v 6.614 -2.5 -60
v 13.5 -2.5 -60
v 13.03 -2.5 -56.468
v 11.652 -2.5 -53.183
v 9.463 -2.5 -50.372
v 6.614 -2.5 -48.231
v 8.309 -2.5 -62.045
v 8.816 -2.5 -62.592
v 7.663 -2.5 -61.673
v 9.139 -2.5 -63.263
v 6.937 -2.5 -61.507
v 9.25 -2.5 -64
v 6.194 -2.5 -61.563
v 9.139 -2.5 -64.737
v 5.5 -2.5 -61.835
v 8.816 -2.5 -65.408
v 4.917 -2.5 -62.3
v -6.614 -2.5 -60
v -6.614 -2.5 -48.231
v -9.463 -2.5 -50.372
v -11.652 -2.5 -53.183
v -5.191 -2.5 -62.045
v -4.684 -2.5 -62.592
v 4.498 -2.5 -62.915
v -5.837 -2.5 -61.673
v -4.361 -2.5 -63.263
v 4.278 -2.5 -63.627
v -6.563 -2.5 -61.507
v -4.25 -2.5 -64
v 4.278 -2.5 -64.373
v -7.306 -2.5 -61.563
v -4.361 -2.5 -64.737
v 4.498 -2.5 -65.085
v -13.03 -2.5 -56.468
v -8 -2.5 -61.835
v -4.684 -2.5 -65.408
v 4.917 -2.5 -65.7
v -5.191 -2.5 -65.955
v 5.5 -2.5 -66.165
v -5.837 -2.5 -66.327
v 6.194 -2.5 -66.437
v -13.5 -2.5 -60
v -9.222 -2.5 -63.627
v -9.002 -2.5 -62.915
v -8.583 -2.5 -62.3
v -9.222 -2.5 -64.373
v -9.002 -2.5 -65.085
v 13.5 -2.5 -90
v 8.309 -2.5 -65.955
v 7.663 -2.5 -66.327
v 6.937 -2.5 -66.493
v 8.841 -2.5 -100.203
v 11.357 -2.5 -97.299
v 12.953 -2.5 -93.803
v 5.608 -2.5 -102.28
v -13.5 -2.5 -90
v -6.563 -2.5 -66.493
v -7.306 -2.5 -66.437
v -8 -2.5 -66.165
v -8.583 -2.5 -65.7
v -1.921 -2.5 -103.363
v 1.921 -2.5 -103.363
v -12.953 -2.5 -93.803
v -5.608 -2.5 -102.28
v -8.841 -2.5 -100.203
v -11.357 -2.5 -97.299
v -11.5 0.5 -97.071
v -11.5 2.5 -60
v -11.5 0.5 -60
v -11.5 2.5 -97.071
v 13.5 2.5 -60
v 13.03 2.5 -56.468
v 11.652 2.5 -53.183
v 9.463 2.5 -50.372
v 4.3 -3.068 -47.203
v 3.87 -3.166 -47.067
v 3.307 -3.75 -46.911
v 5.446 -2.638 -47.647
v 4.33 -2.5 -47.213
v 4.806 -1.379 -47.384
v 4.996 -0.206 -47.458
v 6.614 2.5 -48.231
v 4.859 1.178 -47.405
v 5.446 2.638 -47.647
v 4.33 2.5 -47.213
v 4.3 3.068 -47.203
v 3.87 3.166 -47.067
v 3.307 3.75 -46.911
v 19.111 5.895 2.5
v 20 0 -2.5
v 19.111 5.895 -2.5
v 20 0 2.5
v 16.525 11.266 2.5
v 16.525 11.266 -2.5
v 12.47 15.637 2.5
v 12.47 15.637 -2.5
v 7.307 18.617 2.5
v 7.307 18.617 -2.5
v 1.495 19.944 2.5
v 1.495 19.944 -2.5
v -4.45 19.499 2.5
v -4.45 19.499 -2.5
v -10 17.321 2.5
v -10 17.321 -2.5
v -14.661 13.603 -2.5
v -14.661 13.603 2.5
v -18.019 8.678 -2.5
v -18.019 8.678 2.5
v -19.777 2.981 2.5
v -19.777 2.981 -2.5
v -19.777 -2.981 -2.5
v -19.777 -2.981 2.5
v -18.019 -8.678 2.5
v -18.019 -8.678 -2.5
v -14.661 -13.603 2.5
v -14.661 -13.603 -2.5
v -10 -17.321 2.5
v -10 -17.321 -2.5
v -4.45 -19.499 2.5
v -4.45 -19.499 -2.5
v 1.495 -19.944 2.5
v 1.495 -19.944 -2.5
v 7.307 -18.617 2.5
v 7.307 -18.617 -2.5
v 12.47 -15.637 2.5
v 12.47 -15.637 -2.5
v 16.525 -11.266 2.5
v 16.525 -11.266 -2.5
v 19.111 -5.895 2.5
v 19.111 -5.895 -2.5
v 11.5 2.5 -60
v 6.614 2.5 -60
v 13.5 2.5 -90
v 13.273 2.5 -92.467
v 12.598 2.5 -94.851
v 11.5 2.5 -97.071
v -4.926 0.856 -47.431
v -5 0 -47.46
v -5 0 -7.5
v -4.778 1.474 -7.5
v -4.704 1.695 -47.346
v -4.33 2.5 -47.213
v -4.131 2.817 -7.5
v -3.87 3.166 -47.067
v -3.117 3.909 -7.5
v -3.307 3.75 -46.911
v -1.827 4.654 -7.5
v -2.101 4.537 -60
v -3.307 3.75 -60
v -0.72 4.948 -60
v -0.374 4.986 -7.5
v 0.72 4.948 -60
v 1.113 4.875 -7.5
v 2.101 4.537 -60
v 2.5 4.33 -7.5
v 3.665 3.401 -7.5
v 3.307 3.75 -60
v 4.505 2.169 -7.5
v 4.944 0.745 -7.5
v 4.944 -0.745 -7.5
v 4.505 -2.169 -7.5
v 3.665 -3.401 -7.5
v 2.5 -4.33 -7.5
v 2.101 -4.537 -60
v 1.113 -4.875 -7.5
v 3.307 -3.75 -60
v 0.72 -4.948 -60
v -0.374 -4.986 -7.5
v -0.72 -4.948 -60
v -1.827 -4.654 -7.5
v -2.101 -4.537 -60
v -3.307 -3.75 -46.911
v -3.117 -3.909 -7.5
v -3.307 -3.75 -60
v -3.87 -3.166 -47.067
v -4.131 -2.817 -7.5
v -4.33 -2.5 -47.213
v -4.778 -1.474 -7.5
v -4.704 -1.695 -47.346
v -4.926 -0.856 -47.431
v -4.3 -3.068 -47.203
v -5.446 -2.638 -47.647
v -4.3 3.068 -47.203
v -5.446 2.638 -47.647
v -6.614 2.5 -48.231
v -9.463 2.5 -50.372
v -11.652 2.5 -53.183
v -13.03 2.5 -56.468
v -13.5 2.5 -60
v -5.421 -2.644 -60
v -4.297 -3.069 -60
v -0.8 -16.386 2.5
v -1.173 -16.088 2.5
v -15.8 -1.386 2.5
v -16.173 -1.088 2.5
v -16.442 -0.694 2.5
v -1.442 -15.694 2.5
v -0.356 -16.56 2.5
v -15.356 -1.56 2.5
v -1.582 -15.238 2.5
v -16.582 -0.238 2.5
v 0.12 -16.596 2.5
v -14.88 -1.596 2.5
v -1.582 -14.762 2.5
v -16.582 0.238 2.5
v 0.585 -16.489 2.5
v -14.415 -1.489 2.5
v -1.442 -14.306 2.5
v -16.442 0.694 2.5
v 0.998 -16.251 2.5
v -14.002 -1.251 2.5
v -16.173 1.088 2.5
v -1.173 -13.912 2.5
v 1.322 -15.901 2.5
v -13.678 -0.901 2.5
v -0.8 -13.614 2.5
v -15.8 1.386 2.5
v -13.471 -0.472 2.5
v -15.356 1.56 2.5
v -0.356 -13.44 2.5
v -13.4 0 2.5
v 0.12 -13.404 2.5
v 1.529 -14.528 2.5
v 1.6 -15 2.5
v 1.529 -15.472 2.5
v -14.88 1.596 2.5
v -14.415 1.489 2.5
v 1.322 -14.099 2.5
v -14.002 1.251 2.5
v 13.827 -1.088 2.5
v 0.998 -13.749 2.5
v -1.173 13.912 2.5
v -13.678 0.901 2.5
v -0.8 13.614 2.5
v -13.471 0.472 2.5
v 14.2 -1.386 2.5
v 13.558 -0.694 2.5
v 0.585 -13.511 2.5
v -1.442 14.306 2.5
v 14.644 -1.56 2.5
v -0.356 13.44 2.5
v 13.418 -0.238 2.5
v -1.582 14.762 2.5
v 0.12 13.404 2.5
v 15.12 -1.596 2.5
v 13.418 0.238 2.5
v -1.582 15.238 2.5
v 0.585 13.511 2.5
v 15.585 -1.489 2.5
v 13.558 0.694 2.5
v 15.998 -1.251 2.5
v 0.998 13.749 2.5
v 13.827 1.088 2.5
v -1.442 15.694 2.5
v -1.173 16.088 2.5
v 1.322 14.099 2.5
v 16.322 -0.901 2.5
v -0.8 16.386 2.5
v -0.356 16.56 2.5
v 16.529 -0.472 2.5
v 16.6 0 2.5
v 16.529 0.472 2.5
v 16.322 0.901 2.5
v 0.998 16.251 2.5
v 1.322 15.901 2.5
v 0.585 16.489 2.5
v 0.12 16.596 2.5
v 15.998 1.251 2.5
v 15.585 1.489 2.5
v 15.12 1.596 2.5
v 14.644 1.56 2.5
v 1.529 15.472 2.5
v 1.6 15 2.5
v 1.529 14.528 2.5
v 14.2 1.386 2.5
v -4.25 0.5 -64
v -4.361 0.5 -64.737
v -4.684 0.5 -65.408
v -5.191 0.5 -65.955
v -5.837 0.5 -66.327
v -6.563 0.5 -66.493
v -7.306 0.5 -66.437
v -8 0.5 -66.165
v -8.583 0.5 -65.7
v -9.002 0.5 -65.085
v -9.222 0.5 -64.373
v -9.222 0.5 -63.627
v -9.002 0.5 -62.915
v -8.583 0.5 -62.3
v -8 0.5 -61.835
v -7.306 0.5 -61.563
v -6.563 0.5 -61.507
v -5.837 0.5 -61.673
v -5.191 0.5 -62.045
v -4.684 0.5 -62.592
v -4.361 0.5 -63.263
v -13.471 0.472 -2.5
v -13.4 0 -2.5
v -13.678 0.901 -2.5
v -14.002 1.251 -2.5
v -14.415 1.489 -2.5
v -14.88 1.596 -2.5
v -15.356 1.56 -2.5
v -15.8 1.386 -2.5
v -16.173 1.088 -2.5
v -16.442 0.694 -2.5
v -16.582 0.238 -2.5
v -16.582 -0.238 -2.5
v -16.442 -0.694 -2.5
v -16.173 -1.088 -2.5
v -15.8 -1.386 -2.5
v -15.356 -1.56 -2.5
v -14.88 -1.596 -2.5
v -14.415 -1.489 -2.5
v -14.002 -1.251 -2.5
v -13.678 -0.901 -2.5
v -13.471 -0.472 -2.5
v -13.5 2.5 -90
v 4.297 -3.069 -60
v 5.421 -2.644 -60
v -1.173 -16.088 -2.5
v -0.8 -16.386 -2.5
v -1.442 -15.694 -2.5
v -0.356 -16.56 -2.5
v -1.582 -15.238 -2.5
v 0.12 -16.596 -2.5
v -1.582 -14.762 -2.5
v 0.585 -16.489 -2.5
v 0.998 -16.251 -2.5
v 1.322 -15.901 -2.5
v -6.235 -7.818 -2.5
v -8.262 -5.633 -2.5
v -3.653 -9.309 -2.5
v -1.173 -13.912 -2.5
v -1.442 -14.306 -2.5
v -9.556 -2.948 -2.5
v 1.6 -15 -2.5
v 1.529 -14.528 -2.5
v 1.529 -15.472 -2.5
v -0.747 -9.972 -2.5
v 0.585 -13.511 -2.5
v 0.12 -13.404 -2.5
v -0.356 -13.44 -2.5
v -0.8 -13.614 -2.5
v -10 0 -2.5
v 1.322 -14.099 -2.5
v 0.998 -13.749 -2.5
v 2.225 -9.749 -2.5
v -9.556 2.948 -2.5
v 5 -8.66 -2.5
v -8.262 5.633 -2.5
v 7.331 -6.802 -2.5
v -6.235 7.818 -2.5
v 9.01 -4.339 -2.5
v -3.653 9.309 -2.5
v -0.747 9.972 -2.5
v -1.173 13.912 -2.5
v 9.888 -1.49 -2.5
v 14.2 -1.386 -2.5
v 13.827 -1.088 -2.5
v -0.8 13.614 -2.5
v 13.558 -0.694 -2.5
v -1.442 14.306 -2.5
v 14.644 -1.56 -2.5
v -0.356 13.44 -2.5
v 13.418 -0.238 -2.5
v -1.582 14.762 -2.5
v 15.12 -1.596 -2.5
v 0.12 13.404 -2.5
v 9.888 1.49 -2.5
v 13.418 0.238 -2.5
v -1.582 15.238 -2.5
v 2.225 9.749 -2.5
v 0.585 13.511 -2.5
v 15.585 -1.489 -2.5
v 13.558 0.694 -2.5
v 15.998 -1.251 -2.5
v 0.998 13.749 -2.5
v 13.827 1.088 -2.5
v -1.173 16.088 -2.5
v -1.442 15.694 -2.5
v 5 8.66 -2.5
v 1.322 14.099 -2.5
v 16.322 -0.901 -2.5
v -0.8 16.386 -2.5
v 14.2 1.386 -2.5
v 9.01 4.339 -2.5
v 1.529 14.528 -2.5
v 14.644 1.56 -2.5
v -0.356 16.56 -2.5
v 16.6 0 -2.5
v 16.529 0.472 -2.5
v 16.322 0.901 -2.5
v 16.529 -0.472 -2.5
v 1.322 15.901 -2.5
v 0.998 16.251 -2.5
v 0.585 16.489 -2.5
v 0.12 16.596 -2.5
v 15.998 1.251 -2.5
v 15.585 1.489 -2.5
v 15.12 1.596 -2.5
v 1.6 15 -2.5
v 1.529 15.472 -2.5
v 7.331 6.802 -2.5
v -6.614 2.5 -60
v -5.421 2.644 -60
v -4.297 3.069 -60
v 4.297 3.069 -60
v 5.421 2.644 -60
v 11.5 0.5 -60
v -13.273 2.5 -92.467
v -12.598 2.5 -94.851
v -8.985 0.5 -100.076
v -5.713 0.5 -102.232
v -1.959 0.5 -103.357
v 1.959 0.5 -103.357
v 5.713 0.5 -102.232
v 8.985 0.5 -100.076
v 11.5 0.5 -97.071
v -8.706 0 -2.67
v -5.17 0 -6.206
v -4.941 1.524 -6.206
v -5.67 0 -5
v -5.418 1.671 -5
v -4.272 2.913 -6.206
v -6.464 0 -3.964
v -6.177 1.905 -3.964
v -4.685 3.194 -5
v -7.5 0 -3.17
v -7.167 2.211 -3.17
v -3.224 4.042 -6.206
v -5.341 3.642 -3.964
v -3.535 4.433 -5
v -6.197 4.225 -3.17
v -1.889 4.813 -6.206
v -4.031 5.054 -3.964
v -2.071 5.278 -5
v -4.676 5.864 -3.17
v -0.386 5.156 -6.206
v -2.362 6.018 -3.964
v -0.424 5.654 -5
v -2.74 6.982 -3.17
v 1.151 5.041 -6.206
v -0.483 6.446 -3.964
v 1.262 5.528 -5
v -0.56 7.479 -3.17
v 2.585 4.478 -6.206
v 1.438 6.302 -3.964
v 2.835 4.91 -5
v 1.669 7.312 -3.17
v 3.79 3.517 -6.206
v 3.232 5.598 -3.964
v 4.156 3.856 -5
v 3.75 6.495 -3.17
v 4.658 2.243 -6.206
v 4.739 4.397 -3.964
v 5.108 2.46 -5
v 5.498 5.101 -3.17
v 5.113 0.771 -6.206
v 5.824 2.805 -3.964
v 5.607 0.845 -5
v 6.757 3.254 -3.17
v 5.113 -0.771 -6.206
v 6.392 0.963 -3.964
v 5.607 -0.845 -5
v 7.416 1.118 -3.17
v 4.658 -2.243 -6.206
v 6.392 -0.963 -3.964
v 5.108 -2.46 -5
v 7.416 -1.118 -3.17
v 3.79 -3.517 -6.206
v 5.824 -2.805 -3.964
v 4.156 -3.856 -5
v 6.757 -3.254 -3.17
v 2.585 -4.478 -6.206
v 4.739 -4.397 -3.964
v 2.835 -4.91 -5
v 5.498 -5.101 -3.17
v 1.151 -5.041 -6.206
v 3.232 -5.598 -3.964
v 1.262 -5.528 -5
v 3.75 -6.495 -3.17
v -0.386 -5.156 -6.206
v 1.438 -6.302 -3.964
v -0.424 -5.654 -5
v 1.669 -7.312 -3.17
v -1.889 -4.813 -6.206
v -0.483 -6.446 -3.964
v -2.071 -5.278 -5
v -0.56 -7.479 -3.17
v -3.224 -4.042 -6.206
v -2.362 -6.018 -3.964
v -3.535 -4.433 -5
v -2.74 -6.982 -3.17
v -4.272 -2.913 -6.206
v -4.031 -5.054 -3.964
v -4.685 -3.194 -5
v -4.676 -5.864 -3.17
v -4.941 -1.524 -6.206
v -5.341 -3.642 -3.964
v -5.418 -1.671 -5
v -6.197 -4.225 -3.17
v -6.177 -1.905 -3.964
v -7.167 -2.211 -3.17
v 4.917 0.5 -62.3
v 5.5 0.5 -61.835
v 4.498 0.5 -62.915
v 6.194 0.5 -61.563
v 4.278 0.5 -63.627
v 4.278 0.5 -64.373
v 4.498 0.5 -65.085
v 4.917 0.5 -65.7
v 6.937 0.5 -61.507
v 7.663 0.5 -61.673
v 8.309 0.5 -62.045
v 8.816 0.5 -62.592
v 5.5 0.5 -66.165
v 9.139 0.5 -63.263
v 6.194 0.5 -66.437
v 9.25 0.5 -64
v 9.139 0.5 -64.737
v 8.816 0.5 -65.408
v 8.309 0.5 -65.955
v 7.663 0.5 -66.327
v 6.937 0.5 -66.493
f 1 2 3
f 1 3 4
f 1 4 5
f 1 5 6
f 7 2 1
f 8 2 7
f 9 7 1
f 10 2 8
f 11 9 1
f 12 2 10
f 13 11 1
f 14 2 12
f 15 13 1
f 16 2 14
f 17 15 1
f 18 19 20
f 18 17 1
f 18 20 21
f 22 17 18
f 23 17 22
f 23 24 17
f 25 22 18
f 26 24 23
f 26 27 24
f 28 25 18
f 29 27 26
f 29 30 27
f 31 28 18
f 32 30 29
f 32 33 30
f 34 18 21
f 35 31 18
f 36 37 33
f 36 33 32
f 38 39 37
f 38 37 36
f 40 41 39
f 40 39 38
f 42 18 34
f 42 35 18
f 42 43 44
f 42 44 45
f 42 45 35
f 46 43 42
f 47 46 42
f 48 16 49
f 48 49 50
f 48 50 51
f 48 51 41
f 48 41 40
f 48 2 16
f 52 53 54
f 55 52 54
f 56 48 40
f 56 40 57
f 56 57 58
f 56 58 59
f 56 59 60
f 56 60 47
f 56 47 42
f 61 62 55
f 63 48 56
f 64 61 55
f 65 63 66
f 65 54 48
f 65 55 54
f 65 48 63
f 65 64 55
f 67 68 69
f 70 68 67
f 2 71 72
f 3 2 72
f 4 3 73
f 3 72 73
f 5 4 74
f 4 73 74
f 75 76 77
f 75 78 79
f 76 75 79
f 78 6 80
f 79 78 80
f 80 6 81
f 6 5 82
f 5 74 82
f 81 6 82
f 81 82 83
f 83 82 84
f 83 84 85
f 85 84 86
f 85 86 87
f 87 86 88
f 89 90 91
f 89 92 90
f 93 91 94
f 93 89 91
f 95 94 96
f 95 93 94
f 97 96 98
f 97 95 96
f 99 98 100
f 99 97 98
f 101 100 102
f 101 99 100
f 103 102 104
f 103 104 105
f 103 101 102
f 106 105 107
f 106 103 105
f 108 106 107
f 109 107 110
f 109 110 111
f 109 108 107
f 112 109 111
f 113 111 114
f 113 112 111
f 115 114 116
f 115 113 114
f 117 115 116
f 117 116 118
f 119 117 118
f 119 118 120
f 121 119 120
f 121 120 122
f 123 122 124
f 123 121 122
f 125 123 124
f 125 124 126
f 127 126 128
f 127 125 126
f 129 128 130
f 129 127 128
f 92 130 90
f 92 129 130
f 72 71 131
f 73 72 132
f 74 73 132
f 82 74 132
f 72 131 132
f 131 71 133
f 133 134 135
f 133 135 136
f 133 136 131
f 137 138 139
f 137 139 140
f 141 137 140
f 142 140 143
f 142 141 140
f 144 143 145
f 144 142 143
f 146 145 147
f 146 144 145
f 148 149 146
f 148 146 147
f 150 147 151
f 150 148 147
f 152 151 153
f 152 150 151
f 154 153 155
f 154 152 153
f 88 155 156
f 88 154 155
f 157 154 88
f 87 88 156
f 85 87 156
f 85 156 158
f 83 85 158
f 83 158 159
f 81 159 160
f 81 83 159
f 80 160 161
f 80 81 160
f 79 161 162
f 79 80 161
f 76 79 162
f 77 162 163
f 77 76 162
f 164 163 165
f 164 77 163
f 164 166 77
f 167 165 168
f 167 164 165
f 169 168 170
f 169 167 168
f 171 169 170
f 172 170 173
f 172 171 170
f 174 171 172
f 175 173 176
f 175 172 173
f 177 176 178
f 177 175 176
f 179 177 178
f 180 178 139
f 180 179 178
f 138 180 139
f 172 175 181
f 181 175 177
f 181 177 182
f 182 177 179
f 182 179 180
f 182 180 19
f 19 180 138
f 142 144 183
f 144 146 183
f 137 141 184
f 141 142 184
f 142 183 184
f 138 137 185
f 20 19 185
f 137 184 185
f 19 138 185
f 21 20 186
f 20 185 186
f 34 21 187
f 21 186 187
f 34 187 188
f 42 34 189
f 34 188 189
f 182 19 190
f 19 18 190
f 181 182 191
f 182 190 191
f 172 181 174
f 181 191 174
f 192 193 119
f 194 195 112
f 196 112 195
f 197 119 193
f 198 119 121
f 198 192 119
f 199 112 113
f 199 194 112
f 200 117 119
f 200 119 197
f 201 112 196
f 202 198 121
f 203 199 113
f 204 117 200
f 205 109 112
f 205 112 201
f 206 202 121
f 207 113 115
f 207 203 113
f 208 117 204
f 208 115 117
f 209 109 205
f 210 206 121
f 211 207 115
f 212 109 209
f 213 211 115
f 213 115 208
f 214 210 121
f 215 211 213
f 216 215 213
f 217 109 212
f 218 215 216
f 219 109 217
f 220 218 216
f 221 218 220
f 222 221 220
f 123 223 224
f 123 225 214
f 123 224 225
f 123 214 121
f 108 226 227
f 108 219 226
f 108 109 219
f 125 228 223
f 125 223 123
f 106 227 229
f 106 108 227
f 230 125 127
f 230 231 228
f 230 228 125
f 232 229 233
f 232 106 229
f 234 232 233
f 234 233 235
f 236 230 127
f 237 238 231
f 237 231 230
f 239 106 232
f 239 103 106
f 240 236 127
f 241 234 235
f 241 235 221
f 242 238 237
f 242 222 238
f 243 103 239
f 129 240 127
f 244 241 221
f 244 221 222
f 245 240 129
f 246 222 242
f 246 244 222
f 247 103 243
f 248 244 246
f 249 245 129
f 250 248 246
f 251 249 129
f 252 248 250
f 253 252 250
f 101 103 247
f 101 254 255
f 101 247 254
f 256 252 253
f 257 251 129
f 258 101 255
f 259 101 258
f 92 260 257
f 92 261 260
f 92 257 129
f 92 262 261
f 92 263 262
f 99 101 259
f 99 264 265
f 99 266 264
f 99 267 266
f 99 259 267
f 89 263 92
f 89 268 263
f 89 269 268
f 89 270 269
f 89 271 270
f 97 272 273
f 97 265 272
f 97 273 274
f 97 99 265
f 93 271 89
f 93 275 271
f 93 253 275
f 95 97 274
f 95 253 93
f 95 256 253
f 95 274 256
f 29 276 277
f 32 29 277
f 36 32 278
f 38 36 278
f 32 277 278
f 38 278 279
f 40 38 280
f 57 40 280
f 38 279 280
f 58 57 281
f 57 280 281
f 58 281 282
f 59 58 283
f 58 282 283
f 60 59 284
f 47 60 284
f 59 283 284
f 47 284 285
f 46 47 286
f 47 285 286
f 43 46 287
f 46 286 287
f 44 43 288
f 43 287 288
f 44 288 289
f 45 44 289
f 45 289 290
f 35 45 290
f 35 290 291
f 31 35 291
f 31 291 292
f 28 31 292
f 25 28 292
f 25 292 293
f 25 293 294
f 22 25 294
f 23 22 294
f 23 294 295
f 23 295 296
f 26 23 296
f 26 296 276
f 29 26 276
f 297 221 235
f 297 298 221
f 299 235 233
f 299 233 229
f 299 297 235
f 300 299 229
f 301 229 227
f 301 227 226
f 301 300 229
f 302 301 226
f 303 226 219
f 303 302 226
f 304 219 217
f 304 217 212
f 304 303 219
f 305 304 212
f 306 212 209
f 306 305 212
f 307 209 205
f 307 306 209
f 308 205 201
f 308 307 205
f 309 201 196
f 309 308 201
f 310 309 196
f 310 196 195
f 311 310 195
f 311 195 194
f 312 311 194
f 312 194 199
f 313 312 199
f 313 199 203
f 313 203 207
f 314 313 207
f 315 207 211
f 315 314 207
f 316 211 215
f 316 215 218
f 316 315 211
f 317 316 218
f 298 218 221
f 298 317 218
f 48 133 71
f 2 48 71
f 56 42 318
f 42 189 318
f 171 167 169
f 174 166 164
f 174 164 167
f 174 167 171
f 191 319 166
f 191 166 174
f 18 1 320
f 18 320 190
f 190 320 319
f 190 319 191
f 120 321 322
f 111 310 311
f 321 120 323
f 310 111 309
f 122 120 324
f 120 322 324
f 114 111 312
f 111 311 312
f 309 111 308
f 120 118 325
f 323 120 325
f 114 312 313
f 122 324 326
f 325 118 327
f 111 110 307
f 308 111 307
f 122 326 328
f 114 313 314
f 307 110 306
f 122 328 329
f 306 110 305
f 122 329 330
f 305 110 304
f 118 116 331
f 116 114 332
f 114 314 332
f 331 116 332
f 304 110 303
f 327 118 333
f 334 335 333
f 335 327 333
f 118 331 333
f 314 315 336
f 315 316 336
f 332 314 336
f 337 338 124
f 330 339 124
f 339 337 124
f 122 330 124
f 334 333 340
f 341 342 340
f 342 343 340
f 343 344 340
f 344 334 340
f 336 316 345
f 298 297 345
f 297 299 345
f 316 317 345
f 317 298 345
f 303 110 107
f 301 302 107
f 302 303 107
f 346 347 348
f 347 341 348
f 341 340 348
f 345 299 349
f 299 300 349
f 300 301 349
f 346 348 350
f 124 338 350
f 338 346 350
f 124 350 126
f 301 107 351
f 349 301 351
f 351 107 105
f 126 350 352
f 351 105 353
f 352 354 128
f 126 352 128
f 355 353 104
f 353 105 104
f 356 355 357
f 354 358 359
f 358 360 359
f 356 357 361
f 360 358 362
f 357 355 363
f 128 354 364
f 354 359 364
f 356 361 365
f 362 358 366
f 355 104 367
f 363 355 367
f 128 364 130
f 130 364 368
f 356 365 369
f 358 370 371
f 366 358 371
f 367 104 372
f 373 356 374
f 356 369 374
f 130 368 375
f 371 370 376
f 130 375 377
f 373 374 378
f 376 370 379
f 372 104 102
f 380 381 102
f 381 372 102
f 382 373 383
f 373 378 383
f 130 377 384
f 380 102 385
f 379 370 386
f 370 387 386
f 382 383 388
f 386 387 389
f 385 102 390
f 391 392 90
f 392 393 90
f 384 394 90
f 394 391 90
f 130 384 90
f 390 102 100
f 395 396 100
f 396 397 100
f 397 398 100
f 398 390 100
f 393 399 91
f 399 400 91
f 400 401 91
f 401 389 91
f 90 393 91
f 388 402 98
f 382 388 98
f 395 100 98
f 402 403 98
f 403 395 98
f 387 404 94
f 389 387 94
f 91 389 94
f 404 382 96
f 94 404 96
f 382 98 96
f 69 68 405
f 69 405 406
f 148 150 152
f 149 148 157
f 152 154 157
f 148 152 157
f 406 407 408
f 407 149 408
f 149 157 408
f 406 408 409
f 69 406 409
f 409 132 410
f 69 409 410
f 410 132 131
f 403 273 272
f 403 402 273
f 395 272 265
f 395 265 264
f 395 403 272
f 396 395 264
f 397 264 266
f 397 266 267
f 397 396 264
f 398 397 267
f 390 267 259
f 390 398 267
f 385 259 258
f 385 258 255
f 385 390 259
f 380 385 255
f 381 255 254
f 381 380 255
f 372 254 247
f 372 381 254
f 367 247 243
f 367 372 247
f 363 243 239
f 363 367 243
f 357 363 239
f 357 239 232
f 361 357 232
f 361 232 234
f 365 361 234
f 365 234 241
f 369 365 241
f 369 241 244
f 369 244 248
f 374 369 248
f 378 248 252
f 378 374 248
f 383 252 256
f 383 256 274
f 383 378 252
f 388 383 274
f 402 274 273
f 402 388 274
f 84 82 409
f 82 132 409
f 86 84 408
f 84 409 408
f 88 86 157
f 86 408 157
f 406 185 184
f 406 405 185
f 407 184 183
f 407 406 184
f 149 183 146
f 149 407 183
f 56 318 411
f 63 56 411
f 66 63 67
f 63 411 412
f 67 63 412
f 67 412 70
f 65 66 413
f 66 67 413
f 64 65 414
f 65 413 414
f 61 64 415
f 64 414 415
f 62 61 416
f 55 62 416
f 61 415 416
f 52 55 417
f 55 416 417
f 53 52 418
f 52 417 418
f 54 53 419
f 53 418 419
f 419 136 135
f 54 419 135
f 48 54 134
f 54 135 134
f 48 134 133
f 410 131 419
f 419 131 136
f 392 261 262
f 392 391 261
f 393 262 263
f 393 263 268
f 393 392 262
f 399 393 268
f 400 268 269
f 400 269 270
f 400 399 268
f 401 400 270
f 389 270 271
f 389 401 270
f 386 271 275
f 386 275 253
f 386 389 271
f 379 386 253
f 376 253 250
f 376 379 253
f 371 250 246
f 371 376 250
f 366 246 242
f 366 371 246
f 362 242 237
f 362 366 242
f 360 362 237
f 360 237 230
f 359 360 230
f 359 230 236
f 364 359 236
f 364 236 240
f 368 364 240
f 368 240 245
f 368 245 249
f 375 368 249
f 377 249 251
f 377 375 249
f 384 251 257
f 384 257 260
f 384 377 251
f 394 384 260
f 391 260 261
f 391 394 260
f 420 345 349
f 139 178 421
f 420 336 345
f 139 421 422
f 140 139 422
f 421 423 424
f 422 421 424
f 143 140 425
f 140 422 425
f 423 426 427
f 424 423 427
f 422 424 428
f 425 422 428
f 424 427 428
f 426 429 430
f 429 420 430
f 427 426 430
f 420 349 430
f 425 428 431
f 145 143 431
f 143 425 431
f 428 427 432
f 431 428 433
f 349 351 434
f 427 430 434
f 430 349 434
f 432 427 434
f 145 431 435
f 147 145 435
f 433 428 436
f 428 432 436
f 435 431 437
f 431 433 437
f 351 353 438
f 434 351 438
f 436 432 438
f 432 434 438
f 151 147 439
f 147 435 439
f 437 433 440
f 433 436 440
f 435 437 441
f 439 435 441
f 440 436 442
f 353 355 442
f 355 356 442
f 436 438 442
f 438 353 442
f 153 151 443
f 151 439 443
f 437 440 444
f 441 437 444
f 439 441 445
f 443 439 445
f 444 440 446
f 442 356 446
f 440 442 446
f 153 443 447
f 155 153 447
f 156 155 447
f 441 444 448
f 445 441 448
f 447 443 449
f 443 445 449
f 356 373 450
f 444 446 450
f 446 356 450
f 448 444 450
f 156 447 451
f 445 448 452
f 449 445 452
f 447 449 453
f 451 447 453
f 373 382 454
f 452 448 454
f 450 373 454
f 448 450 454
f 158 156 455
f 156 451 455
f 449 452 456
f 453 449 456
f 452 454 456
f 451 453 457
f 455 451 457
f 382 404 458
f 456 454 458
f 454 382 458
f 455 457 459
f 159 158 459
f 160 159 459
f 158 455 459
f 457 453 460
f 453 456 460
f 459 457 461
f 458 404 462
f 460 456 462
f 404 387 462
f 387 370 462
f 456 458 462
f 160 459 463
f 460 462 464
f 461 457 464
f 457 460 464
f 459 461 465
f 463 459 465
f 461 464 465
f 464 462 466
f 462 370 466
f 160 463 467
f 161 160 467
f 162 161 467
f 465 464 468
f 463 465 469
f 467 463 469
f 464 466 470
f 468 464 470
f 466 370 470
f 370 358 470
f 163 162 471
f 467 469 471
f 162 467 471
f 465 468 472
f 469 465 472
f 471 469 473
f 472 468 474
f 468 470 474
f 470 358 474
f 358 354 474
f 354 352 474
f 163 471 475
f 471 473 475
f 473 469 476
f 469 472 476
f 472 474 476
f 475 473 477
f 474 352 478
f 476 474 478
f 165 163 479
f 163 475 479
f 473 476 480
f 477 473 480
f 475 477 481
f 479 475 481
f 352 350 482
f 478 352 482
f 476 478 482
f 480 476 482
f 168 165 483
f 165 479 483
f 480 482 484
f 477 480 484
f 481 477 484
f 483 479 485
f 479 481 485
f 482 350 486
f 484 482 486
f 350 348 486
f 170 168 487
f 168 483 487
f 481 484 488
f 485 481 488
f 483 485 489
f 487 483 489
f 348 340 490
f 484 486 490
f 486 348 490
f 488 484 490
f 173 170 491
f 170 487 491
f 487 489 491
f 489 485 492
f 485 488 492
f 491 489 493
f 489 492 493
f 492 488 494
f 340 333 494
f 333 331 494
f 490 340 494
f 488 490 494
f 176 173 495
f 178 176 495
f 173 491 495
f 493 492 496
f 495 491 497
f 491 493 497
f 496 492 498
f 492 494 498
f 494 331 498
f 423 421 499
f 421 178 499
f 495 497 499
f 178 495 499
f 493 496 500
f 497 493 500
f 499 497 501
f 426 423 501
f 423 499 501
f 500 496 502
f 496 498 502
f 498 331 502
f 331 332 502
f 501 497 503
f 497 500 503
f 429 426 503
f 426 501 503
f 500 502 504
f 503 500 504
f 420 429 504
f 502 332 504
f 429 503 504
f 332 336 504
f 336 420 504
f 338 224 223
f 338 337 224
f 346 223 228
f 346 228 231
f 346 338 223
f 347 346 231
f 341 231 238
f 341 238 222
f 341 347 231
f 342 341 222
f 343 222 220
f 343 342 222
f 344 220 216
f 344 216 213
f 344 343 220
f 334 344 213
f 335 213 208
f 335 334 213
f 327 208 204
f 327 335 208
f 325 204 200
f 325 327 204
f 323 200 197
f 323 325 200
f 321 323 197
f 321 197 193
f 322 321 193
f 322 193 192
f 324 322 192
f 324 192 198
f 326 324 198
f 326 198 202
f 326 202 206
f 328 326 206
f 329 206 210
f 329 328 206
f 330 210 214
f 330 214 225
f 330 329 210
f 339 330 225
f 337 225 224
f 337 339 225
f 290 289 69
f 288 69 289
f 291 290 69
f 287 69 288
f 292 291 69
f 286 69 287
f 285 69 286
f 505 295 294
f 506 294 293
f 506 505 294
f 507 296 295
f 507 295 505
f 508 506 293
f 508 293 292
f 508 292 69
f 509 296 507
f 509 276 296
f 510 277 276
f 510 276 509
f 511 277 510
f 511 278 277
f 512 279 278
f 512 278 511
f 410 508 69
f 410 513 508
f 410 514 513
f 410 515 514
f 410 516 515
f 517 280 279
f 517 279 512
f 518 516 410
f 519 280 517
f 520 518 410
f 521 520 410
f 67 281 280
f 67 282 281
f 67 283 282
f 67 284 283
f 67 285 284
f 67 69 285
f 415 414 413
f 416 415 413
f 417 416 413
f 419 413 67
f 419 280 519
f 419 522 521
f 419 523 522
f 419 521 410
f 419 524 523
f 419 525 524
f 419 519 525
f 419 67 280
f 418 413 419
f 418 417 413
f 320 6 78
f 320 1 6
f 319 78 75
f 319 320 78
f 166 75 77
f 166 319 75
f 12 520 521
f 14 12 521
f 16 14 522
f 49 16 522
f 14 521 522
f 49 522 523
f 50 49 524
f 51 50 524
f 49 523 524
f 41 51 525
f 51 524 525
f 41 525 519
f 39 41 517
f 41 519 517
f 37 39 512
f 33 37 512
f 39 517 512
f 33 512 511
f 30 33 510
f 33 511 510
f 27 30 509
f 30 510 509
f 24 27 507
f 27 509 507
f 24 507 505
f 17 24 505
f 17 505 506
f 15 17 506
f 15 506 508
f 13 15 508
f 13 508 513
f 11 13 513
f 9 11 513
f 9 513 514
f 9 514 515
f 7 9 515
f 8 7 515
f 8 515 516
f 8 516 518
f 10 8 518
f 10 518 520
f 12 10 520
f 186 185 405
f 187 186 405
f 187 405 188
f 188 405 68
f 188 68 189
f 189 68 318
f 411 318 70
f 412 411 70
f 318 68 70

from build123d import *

# Parameters (mm, degrees)
SKETCH_1_R          = 20
SKETCH_1_R_2        = 1.6
EXTRUDE_1_DEPTH     = 2.5
SWEEP_1_PROFILE_R   = 5
EXTRUDE_2_DEPTH     = 2.5
SKETCH_10_W         = 23
SKETCH_10_H         = 44.650800955
CUT_EXTRUDE_1_DEPTH = 2
SKETCH_11_R         = 2.5
CUT_EXTRUDE_2_DEPTH = 21.5
FILLET_1_R          = 5


with BuildPart() as part:
    # 草图1 → 凸台-拉伸1 (new body, symmetric)
    with BuildSketch(Plane.XY):
        Circle(SKETCH_1_R)
        with Locations((0, 15)):
            Circle(SKETCH_1_R_2, mode=Mode.SUBTRACT)
        with Locations((15, 0)):
            Circle(SKETCH_1_R_2, mode=Mode.SUBTRACT)
        with Locations((0, -15)):
            Circle(SKETCH_1_R_2, mode=Mode.SUBTRACT)
        with Locations((-15, 0)):
            Circle(SKETCH_1_R_2, mode=Mode.SUBTRACT)
    extrude(amount=EXTRUDE_1_DEPTH, both=True)

    # 扫描1: sweep along a path in 草图4
    with BuildLine(Plane(origin=(0, 0, 0), x_dir=(1, 0, 0), z_dir=(0, 1, 0))) as sweep_1_path:
        Line((0, 0), (0, 60))
    # 扫描1 profile (on start of the path) → 扫描1 (sweep)
    with BuildSketch(Plane(origin=(0, 0, 0), x_dir=(-1, 0, 0), z_dir=(0, 0, -1))):
        Circle(SWEEP_1_PROFILE_R)
    sweep(path=sweep_1_path.line)

    # 草图9 → 凸台-拉伸2 (add, symmetric)
    with BuildSketch(Plane(origin=(0, 0, 0), x_dir=(1, 0, 0), z_dir=(0, 1, 0))):
        with BuildLine():
            Line((13.5, 90), (13.5, 60))
            ThreePointArc((13.5, 60), (0, 46.5), (-13.5, 60))
            Line((-13.5, 60), (-13.5, 90))
            ThreePointArc((-13.5, 90), (0, 103.5), (13.5, 90))
        make_face()
    extrude(amount=EXTRUDE_2_DEPTH, both=True)

    # 草图10 → 切除-拉伸1 (cut)
    with BuildSketch(Plane(origin=(0, 2.5, 0), x_dir=(1, 0, 0), z_dir=(0, 1, 0))):
        with Locations((0, 82.325400478)):
            Rectangle(SKETCH_10_W, SKETCH_10_H)
    extrude(amount=-CUT_EXTRUDE_1_DEPTH, mode=Mode.SUBTRACT)

    # 草图11 → 切除-拉伸2 (cut, through all)
    with BuildSketch(Plane(origin=(0, 0.5, 0), x_dir=(1, 0, 0), z_dir=(0, 1, 0))):
        with Locations((-6.75, 64)):
            Circle(SKETCH_11_R)
        with Locations((6.75, 64)):
            Circle(SKETCH_11_R)
    extrude(amount=-CUT_EXTRUDE_2_DEPTH, mode=Mode.SUBTRACT)

    # 圆角1
    fillet_1_edges = [part.edges().sort_by_distance(p)[0] for p in [
        (5, 0, -2.5),
        (4.330127019, -2.5, -53.606644074),
        (-4.330127019, -2.5, -53.606644074),
        (4.330127019, 2.5, -53.606644074),
        (-4.330127019, 2.5, -53.606644074),
    ]]
    fillet(fillet_1_edges, radius=FILLET_1_R)


solid = part.part
